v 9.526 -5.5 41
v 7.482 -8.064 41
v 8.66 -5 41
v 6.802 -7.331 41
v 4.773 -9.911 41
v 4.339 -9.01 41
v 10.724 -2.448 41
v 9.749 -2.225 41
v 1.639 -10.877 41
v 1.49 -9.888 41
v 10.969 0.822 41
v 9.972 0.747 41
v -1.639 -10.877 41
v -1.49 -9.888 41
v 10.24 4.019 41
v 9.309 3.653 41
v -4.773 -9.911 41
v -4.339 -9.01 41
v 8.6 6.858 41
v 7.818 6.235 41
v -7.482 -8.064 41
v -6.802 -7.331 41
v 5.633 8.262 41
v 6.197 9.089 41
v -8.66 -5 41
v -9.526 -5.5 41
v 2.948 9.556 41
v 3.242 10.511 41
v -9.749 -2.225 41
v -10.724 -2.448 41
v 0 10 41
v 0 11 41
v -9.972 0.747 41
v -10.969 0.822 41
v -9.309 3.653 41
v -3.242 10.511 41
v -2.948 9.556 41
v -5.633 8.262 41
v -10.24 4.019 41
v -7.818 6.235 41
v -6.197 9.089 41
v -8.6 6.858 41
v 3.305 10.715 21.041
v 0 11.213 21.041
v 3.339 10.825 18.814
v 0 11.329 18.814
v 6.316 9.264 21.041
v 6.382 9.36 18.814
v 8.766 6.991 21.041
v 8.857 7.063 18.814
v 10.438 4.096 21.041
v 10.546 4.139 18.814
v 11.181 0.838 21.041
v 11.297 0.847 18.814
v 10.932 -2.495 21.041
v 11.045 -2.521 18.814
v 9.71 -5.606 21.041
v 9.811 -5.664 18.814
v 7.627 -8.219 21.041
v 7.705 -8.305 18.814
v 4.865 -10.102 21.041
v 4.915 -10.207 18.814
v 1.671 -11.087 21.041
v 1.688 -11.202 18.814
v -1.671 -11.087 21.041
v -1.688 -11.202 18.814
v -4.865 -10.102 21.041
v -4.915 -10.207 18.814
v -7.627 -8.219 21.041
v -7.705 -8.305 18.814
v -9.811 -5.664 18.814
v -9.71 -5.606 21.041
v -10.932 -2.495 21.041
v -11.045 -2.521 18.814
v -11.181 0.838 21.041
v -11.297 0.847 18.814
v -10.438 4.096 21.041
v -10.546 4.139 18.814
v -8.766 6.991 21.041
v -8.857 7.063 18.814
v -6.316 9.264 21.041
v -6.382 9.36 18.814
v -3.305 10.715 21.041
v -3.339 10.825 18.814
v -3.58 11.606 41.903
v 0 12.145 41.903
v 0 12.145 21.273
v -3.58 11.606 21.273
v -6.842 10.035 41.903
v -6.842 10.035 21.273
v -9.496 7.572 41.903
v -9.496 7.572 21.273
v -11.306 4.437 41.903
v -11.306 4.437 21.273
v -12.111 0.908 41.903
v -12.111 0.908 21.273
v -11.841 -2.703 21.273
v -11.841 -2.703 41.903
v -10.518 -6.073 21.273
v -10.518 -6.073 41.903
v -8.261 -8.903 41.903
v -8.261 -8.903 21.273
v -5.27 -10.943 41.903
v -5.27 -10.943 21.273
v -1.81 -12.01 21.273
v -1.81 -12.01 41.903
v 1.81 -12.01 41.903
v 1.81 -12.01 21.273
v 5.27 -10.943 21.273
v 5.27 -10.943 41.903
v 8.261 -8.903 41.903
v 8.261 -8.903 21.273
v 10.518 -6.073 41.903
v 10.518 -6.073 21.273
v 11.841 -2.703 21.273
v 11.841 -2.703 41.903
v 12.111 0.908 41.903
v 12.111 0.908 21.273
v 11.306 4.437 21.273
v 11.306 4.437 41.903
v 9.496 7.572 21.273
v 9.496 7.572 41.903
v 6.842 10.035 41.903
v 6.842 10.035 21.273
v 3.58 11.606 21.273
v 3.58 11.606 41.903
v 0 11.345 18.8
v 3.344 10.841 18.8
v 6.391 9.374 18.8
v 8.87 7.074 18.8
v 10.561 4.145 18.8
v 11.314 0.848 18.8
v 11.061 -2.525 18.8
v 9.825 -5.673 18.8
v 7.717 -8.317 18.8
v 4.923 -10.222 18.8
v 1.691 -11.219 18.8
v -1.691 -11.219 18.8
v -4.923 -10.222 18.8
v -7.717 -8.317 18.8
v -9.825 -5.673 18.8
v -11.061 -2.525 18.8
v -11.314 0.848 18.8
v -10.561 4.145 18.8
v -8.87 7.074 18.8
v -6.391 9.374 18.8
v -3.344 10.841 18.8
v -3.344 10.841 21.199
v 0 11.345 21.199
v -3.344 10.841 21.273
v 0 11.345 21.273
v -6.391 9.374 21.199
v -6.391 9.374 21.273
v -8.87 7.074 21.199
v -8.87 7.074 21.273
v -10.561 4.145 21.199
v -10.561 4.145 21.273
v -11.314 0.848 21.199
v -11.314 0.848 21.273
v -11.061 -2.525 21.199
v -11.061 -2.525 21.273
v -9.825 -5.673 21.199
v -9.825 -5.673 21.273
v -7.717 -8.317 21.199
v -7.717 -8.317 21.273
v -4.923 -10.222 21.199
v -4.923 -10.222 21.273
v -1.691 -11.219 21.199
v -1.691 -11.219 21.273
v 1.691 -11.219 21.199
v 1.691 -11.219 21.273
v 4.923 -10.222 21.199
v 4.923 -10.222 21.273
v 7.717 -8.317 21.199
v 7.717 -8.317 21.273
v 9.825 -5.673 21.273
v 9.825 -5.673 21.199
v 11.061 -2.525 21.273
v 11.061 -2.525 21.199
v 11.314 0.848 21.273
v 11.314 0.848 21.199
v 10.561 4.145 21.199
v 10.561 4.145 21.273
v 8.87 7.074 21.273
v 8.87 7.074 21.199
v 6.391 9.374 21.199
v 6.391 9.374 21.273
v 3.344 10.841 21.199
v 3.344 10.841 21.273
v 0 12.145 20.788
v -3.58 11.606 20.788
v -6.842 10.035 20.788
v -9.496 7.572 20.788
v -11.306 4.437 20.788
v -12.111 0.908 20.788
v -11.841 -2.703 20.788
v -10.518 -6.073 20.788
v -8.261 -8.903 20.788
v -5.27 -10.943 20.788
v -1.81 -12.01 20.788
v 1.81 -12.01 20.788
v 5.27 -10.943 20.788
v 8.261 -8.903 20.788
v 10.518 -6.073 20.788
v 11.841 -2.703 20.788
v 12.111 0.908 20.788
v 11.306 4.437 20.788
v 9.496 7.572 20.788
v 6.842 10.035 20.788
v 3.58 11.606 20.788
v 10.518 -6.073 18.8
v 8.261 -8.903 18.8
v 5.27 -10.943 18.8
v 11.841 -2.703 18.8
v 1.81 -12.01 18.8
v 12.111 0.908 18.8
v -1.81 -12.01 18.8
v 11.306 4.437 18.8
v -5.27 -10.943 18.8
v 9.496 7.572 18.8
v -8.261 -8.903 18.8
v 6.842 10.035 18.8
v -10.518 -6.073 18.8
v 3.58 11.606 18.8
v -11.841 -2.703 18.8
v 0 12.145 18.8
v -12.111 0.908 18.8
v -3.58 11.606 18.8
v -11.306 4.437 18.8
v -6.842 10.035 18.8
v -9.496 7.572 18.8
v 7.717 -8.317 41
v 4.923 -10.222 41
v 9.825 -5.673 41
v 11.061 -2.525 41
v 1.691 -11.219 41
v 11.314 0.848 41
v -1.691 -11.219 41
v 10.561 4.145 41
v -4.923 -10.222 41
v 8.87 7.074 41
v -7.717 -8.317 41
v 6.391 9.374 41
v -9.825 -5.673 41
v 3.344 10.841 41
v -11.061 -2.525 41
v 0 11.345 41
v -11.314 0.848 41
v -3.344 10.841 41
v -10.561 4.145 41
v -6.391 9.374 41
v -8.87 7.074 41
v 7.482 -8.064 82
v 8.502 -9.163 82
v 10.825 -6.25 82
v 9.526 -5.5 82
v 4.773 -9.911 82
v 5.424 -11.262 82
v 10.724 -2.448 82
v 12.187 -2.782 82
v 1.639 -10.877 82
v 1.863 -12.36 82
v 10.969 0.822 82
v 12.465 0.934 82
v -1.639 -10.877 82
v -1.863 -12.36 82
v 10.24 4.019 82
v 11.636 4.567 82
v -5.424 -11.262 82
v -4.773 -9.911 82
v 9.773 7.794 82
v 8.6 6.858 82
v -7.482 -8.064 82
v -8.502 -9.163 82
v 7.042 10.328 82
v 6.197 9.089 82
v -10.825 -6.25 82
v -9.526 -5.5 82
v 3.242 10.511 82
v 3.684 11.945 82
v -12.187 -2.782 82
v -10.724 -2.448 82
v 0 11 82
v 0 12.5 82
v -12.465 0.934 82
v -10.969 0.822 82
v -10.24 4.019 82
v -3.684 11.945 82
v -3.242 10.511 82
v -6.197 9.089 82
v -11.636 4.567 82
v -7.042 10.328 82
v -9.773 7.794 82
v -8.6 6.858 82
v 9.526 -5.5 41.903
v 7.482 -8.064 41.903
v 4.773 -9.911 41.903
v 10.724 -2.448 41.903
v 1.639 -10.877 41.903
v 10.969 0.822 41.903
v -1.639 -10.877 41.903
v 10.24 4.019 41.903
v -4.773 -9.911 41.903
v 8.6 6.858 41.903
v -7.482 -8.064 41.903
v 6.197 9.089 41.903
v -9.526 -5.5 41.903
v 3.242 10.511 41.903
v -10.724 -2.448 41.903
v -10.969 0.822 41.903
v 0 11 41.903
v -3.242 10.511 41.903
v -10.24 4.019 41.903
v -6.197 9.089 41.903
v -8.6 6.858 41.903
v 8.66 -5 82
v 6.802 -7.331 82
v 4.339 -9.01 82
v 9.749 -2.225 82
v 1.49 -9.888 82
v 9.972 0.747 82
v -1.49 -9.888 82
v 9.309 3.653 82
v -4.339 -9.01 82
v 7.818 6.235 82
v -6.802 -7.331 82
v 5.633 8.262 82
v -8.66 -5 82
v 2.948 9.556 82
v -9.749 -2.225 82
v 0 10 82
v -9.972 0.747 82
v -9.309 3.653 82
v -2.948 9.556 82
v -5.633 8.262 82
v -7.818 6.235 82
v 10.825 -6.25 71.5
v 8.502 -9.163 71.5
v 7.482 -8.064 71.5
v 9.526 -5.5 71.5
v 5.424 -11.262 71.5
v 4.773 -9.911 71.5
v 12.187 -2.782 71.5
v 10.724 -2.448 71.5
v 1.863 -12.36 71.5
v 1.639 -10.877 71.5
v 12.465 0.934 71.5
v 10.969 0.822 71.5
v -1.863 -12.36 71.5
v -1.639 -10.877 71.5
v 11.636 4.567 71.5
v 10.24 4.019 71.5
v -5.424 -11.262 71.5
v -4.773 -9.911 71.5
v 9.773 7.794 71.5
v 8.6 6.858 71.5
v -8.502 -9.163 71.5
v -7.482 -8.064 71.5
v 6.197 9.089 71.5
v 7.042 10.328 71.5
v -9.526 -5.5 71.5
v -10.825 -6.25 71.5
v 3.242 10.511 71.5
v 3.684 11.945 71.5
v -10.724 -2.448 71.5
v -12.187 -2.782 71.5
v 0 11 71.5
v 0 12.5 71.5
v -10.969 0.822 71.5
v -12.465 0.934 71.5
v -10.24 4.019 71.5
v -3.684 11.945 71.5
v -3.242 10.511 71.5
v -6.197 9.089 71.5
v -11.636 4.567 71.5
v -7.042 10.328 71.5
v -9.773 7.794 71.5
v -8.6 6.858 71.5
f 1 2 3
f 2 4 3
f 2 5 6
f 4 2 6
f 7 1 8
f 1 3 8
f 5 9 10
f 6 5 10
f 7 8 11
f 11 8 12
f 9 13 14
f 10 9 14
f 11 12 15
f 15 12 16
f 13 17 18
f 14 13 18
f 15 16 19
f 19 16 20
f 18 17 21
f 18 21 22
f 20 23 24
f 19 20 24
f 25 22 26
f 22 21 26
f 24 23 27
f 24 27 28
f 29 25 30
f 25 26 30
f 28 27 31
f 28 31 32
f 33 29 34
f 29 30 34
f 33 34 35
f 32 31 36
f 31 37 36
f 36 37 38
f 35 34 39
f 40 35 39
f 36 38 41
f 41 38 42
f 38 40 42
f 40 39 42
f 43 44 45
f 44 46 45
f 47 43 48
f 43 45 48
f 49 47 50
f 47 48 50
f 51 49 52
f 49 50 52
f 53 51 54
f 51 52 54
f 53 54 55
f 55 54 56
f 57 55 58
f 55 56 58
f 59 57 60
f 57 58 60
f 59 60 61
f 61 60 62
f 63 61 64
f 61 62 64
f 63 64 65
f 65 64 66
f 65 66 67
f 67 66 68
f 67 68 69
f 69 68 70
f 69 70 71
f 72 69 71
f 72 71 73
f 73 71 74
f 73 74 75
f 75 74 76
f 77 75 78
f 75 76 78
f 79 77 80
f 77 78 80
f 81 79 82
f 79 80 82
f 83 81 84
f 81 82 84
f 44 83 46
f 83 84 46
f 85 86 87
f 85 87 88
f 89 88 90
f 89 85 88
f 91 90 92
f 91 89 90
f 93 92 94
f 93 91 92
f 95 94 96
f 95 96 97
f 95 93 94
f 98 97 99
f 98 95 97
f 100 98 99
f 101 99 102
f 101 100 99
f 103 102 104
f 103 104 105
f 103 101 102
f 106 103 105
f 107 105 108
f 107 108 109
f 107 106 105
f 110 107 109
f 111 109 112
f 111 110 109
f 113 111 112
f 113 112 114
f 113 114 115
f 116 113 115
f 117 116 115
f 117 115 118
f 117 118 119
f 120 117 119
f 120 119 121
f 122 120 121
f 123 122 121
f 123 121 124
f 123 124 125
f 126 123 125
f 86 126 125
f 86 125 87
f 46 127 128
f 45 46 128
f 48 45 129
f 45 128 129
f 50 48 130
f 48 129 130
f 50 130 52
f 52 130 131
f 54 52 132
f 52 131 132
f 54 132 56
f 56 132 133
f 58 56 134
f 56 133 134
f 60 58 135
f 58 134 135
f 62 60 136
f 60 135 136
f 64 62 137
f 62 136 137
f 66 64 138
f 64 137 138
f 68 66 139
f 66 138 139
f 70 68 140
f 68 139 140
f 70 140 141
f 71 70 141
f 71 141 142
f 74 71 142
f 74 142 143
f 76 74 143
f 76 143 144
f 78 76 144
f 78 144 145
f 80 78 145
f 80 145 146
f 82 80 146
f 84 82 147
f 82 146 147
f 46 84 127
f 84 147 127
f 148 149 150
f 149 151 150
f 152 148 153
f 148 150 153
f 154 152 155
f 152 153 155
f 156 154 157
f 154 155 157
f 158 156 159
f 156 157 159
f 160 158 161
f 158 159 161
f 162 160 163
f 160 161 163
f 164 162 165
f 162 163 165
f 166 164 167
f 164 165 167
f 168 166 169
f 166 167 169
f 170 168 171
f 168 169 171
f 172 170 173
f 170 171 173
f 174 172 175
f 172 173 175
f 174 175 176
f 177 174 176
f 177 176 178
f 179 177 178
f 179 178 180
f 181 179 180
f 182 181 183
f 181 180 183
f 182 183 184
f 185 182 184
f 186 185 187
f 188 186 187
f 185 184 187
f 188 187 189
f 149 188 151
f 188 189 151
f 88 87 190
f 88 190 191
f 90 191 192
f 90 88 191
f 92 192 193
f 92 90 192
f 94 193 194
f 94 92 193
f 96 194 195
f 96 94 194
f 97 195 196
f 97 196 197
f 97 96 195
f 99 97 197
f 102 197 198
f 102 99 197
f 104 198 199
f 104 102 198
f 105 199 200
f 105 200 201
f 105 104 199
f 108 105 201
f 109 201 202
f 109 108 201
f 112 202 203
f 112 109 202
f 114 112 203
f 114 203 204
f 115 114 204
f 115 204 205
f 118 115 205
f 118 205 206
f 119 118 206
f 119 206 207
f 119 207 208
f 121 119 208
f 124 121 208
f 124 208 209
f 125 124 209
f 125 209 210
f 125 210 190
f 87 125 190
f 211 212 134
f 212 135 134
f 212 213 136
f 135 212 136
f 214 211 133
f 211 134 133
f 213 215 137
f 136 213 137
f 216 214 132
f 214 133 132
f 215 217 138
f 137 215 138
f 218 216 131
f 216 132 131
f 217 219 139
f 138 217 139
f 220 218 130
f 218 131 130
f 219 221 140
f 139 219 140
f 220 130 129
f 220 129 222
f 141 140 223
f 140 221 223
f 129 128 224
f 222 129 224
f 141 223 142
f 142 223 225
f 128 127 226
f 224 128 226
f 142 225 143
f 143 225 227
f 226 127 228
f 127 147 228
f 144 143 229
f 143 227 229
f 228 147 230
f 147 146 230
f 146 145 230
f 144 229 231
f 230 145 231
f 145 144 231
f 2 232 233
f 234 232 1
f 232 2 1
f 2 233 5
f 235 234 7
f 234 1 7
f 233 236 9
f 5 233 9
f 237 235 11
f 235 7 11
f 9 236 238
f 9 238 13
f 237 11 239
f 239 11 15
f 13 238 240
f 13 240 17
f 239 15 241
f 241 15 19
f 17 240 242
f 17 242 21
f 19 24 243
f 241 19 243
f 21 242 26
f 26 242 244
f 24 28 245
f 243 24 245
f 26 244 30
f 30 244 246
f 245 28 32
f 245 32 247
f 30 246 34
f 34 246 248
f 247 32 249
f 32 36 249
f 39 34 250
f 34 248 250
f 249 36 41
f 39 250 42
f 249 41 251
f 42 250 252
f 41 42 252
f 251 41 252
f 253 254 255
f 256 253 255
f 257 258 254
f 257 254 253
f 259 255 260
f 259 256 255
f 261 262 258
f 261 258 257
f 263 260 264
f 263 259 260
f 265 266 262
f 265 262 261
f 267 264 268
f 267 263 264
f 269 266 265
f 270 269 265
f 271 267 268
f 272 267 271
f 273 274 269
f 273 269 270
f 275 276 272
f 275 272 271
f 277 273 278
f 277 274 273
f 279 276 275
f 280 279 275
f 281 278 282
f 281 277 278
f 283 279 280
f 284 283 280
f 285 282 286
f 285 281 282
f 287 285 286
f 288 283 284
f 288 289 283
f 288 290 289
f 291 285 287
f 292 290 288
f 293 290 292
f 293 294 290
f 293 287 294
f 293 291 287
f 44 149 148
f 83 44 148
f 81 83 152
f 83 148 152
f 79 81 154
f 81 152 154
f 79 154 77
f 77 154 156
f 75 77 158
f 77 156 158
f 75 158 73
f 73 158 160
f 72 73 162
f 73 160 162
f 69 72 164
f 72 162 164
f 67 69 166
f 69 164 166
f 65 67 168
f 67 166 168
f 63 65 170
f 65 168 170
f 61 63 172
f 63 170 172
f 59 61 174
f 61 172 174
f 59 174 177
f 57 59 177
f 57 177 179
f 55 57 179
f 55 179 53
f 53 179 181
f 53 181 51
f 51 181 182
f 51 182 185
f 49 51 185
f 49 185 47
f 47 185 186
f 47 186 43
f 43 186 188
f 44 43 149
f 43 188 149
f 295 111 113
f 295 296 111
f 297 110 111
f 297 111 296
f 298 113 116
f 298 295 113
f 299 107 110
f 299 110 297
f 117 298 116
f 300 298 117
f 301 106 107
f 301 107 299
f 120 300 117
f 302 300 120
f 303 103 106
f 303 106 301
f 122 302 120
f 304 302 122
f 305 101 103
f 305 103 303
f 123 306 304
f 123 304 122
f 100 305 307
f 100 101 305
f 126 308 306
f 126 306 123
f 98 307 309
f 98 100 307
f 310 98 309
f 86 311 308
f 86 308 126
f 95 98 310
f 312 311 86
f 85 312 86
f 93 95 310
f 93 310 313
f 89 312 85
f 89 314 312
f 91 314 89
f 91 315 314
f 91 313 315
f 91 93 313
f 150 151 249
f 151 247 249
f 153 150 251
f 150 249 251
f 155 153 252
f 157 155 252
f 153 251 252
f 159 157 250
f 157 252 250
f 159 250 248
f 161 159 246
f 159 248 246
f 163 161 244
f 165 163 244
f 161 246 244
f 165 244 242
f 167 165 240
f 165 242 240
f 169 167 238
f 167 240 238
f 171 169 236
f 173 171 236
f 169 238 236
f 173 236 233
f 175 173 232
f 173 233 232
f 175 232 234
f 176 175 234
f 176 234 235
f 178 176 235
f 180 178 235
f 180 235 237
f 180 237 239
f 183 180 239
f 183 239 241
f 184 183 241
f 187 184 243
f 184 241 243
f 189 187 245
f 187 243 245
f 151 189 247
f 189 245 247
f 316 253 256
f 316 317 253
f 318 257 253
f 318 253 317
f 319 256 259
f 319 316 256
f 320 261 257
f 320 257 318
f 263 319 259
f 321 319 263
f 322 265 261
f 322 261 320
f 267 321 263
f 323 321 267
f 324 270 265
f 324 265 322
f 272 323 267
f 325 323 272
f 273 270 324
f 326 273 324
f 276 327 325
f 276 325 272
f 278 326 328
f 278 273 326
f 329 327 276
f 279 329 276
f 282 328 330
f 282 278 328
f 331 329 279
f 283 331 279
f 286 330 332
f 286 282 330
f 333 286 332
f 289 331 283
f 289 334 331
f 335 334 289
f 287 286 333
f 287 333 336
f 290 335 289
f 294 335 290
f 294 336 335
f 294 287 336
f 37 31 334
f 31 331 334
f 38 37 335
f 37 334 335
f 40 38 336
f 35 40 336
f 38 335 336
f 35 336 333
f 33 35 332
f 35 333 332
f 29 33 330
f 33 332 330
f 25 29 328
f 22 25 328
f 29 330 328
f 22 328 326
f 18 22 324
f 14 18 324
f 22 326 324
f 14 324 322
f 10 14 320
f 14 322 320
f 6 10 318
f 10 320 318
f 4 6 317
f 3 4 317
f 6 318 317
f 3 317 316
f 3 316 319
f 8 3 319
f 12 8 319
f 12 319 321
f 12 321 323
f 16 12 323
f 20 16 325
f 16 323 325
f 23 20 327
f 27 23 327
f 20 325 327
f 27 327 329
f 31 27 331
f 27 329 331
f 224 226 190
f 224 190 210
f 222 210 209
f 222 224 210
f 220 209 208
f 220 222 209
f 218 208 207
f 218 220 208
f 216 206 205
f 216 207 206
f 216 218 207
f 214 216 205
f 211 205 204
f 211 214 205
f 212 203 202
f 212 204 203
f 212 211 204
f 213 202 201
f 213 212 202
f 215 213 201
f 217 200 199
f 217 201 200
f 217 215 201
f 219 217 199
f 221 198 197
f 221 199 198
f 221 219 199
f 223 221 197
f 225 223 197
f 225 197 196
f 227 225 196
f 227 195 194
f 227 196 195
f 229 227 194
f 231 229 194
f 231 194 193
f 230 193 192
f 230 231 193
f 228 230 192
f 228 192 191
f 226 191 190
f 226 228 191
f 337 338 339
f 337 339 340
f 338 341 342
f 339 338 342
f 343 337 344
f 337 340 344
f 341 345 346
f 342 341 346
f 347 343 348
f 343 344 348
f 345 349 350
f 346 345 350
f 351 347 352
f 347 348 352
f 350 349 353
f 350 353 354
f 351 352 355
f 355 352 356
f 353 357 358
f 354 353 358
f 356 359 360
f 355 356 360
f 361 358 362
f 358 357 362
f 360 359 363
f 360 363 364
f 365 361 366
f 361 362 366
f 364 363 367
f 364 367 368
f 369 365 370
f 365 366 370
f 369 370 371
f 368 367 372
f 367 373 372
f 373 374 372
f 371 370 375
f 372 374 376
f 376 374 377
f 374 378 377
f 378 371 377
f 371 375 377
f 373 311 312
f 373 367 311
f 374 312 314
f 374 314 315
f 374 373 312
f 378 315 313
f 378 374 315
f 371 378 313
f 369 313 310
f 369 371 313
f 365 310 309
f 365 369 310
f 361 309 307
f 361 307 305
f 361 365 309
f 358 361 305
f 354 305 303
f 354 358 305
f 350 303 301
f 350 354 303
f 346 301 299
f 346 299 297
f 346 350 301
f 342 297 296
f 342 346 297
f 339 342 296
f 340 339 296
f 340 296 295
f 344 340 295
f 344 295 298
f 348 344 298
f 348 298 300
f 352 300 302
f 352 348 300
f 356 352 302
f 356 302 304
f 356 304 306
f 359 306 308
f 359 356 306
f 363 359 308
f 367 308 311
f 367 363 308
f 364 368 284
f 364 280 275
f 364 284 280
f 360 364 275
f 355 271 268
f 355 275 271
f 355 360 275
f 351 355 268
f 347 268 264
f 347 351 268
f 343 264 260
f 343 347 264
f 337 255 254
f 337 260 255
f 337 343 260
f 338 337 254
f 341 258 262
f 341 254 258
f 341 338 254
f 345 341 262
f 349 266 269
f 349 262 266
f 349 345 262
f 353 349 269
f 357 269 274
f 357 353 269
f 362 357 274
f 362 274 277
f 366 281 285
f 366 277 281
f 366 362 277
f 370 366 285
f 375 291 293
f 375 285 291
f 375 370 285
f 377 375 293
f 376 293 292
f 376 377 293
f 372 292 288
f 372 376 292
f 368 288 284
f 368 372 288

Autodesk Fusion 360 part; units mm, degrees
sketch "Sketch1" plane through (0, 0, 0) normal (1, 0, 0) x (0, 0, -1)
  line L0 (-41.9028, 11) -> (-71.5, 11)
  line L1 (-82, 11) -> (-82, 12.5)
  line L2 (-82, 12.5) -> (-71.5, 12.5)
  line L3 (-71.5, 12.5) -> (-71.5, 11)
  line L4 (-71.5, 11) -> (-41.9028, 11)
  line L5 (-41, 11) -> (-41, 10)
  line L6 (-41, 10) -> (-82, 10)
  line L7 (-82, 10) -> (-82, 11)
  line L8 (-21.273, 11.3453) -> (-41, 11.3453)
  line L9 (-41, 11.3453) -> (-41, 11)
  line L10 (-21.273, 12.1453) -> (-41.9028, 12.1453)
  line L11 (-41.9028, 12.1453) -> (-41.9028, 11)
  line L12 (-20.7884, 12.1453) -> (-21.273, 12.1453)
  line L13 (-20.7884, 12.1453) -> (-18.8, 12.1453)
  line L14 (-18.8, 12.1453) -> (-18.8, 11.3453)
  line L15 (-21.1992, 11.3453) -> (-21.273, 11.3453)
  line L16 (-21.1992, 11.3453) -> (-21.0412, 11.2127)
  line L17 (-18.8, 11.3453) -> (-18.8139, 11.3287)
  line L18 (-21.0412, 11.2127) -> (-18.8139, 11.3287)
  point P0 (-20.7884, 10.9915)
  dimension "d1" = 1.5
  dimension "d2" = 10.5
  dimension "d3" = 0.8
  dimension "d4" = 0.6
revolve "Revolve1" add sketch "Sketch1" angle 360 about axis through (0, 0, 1.75) along (0, 0, 1)
